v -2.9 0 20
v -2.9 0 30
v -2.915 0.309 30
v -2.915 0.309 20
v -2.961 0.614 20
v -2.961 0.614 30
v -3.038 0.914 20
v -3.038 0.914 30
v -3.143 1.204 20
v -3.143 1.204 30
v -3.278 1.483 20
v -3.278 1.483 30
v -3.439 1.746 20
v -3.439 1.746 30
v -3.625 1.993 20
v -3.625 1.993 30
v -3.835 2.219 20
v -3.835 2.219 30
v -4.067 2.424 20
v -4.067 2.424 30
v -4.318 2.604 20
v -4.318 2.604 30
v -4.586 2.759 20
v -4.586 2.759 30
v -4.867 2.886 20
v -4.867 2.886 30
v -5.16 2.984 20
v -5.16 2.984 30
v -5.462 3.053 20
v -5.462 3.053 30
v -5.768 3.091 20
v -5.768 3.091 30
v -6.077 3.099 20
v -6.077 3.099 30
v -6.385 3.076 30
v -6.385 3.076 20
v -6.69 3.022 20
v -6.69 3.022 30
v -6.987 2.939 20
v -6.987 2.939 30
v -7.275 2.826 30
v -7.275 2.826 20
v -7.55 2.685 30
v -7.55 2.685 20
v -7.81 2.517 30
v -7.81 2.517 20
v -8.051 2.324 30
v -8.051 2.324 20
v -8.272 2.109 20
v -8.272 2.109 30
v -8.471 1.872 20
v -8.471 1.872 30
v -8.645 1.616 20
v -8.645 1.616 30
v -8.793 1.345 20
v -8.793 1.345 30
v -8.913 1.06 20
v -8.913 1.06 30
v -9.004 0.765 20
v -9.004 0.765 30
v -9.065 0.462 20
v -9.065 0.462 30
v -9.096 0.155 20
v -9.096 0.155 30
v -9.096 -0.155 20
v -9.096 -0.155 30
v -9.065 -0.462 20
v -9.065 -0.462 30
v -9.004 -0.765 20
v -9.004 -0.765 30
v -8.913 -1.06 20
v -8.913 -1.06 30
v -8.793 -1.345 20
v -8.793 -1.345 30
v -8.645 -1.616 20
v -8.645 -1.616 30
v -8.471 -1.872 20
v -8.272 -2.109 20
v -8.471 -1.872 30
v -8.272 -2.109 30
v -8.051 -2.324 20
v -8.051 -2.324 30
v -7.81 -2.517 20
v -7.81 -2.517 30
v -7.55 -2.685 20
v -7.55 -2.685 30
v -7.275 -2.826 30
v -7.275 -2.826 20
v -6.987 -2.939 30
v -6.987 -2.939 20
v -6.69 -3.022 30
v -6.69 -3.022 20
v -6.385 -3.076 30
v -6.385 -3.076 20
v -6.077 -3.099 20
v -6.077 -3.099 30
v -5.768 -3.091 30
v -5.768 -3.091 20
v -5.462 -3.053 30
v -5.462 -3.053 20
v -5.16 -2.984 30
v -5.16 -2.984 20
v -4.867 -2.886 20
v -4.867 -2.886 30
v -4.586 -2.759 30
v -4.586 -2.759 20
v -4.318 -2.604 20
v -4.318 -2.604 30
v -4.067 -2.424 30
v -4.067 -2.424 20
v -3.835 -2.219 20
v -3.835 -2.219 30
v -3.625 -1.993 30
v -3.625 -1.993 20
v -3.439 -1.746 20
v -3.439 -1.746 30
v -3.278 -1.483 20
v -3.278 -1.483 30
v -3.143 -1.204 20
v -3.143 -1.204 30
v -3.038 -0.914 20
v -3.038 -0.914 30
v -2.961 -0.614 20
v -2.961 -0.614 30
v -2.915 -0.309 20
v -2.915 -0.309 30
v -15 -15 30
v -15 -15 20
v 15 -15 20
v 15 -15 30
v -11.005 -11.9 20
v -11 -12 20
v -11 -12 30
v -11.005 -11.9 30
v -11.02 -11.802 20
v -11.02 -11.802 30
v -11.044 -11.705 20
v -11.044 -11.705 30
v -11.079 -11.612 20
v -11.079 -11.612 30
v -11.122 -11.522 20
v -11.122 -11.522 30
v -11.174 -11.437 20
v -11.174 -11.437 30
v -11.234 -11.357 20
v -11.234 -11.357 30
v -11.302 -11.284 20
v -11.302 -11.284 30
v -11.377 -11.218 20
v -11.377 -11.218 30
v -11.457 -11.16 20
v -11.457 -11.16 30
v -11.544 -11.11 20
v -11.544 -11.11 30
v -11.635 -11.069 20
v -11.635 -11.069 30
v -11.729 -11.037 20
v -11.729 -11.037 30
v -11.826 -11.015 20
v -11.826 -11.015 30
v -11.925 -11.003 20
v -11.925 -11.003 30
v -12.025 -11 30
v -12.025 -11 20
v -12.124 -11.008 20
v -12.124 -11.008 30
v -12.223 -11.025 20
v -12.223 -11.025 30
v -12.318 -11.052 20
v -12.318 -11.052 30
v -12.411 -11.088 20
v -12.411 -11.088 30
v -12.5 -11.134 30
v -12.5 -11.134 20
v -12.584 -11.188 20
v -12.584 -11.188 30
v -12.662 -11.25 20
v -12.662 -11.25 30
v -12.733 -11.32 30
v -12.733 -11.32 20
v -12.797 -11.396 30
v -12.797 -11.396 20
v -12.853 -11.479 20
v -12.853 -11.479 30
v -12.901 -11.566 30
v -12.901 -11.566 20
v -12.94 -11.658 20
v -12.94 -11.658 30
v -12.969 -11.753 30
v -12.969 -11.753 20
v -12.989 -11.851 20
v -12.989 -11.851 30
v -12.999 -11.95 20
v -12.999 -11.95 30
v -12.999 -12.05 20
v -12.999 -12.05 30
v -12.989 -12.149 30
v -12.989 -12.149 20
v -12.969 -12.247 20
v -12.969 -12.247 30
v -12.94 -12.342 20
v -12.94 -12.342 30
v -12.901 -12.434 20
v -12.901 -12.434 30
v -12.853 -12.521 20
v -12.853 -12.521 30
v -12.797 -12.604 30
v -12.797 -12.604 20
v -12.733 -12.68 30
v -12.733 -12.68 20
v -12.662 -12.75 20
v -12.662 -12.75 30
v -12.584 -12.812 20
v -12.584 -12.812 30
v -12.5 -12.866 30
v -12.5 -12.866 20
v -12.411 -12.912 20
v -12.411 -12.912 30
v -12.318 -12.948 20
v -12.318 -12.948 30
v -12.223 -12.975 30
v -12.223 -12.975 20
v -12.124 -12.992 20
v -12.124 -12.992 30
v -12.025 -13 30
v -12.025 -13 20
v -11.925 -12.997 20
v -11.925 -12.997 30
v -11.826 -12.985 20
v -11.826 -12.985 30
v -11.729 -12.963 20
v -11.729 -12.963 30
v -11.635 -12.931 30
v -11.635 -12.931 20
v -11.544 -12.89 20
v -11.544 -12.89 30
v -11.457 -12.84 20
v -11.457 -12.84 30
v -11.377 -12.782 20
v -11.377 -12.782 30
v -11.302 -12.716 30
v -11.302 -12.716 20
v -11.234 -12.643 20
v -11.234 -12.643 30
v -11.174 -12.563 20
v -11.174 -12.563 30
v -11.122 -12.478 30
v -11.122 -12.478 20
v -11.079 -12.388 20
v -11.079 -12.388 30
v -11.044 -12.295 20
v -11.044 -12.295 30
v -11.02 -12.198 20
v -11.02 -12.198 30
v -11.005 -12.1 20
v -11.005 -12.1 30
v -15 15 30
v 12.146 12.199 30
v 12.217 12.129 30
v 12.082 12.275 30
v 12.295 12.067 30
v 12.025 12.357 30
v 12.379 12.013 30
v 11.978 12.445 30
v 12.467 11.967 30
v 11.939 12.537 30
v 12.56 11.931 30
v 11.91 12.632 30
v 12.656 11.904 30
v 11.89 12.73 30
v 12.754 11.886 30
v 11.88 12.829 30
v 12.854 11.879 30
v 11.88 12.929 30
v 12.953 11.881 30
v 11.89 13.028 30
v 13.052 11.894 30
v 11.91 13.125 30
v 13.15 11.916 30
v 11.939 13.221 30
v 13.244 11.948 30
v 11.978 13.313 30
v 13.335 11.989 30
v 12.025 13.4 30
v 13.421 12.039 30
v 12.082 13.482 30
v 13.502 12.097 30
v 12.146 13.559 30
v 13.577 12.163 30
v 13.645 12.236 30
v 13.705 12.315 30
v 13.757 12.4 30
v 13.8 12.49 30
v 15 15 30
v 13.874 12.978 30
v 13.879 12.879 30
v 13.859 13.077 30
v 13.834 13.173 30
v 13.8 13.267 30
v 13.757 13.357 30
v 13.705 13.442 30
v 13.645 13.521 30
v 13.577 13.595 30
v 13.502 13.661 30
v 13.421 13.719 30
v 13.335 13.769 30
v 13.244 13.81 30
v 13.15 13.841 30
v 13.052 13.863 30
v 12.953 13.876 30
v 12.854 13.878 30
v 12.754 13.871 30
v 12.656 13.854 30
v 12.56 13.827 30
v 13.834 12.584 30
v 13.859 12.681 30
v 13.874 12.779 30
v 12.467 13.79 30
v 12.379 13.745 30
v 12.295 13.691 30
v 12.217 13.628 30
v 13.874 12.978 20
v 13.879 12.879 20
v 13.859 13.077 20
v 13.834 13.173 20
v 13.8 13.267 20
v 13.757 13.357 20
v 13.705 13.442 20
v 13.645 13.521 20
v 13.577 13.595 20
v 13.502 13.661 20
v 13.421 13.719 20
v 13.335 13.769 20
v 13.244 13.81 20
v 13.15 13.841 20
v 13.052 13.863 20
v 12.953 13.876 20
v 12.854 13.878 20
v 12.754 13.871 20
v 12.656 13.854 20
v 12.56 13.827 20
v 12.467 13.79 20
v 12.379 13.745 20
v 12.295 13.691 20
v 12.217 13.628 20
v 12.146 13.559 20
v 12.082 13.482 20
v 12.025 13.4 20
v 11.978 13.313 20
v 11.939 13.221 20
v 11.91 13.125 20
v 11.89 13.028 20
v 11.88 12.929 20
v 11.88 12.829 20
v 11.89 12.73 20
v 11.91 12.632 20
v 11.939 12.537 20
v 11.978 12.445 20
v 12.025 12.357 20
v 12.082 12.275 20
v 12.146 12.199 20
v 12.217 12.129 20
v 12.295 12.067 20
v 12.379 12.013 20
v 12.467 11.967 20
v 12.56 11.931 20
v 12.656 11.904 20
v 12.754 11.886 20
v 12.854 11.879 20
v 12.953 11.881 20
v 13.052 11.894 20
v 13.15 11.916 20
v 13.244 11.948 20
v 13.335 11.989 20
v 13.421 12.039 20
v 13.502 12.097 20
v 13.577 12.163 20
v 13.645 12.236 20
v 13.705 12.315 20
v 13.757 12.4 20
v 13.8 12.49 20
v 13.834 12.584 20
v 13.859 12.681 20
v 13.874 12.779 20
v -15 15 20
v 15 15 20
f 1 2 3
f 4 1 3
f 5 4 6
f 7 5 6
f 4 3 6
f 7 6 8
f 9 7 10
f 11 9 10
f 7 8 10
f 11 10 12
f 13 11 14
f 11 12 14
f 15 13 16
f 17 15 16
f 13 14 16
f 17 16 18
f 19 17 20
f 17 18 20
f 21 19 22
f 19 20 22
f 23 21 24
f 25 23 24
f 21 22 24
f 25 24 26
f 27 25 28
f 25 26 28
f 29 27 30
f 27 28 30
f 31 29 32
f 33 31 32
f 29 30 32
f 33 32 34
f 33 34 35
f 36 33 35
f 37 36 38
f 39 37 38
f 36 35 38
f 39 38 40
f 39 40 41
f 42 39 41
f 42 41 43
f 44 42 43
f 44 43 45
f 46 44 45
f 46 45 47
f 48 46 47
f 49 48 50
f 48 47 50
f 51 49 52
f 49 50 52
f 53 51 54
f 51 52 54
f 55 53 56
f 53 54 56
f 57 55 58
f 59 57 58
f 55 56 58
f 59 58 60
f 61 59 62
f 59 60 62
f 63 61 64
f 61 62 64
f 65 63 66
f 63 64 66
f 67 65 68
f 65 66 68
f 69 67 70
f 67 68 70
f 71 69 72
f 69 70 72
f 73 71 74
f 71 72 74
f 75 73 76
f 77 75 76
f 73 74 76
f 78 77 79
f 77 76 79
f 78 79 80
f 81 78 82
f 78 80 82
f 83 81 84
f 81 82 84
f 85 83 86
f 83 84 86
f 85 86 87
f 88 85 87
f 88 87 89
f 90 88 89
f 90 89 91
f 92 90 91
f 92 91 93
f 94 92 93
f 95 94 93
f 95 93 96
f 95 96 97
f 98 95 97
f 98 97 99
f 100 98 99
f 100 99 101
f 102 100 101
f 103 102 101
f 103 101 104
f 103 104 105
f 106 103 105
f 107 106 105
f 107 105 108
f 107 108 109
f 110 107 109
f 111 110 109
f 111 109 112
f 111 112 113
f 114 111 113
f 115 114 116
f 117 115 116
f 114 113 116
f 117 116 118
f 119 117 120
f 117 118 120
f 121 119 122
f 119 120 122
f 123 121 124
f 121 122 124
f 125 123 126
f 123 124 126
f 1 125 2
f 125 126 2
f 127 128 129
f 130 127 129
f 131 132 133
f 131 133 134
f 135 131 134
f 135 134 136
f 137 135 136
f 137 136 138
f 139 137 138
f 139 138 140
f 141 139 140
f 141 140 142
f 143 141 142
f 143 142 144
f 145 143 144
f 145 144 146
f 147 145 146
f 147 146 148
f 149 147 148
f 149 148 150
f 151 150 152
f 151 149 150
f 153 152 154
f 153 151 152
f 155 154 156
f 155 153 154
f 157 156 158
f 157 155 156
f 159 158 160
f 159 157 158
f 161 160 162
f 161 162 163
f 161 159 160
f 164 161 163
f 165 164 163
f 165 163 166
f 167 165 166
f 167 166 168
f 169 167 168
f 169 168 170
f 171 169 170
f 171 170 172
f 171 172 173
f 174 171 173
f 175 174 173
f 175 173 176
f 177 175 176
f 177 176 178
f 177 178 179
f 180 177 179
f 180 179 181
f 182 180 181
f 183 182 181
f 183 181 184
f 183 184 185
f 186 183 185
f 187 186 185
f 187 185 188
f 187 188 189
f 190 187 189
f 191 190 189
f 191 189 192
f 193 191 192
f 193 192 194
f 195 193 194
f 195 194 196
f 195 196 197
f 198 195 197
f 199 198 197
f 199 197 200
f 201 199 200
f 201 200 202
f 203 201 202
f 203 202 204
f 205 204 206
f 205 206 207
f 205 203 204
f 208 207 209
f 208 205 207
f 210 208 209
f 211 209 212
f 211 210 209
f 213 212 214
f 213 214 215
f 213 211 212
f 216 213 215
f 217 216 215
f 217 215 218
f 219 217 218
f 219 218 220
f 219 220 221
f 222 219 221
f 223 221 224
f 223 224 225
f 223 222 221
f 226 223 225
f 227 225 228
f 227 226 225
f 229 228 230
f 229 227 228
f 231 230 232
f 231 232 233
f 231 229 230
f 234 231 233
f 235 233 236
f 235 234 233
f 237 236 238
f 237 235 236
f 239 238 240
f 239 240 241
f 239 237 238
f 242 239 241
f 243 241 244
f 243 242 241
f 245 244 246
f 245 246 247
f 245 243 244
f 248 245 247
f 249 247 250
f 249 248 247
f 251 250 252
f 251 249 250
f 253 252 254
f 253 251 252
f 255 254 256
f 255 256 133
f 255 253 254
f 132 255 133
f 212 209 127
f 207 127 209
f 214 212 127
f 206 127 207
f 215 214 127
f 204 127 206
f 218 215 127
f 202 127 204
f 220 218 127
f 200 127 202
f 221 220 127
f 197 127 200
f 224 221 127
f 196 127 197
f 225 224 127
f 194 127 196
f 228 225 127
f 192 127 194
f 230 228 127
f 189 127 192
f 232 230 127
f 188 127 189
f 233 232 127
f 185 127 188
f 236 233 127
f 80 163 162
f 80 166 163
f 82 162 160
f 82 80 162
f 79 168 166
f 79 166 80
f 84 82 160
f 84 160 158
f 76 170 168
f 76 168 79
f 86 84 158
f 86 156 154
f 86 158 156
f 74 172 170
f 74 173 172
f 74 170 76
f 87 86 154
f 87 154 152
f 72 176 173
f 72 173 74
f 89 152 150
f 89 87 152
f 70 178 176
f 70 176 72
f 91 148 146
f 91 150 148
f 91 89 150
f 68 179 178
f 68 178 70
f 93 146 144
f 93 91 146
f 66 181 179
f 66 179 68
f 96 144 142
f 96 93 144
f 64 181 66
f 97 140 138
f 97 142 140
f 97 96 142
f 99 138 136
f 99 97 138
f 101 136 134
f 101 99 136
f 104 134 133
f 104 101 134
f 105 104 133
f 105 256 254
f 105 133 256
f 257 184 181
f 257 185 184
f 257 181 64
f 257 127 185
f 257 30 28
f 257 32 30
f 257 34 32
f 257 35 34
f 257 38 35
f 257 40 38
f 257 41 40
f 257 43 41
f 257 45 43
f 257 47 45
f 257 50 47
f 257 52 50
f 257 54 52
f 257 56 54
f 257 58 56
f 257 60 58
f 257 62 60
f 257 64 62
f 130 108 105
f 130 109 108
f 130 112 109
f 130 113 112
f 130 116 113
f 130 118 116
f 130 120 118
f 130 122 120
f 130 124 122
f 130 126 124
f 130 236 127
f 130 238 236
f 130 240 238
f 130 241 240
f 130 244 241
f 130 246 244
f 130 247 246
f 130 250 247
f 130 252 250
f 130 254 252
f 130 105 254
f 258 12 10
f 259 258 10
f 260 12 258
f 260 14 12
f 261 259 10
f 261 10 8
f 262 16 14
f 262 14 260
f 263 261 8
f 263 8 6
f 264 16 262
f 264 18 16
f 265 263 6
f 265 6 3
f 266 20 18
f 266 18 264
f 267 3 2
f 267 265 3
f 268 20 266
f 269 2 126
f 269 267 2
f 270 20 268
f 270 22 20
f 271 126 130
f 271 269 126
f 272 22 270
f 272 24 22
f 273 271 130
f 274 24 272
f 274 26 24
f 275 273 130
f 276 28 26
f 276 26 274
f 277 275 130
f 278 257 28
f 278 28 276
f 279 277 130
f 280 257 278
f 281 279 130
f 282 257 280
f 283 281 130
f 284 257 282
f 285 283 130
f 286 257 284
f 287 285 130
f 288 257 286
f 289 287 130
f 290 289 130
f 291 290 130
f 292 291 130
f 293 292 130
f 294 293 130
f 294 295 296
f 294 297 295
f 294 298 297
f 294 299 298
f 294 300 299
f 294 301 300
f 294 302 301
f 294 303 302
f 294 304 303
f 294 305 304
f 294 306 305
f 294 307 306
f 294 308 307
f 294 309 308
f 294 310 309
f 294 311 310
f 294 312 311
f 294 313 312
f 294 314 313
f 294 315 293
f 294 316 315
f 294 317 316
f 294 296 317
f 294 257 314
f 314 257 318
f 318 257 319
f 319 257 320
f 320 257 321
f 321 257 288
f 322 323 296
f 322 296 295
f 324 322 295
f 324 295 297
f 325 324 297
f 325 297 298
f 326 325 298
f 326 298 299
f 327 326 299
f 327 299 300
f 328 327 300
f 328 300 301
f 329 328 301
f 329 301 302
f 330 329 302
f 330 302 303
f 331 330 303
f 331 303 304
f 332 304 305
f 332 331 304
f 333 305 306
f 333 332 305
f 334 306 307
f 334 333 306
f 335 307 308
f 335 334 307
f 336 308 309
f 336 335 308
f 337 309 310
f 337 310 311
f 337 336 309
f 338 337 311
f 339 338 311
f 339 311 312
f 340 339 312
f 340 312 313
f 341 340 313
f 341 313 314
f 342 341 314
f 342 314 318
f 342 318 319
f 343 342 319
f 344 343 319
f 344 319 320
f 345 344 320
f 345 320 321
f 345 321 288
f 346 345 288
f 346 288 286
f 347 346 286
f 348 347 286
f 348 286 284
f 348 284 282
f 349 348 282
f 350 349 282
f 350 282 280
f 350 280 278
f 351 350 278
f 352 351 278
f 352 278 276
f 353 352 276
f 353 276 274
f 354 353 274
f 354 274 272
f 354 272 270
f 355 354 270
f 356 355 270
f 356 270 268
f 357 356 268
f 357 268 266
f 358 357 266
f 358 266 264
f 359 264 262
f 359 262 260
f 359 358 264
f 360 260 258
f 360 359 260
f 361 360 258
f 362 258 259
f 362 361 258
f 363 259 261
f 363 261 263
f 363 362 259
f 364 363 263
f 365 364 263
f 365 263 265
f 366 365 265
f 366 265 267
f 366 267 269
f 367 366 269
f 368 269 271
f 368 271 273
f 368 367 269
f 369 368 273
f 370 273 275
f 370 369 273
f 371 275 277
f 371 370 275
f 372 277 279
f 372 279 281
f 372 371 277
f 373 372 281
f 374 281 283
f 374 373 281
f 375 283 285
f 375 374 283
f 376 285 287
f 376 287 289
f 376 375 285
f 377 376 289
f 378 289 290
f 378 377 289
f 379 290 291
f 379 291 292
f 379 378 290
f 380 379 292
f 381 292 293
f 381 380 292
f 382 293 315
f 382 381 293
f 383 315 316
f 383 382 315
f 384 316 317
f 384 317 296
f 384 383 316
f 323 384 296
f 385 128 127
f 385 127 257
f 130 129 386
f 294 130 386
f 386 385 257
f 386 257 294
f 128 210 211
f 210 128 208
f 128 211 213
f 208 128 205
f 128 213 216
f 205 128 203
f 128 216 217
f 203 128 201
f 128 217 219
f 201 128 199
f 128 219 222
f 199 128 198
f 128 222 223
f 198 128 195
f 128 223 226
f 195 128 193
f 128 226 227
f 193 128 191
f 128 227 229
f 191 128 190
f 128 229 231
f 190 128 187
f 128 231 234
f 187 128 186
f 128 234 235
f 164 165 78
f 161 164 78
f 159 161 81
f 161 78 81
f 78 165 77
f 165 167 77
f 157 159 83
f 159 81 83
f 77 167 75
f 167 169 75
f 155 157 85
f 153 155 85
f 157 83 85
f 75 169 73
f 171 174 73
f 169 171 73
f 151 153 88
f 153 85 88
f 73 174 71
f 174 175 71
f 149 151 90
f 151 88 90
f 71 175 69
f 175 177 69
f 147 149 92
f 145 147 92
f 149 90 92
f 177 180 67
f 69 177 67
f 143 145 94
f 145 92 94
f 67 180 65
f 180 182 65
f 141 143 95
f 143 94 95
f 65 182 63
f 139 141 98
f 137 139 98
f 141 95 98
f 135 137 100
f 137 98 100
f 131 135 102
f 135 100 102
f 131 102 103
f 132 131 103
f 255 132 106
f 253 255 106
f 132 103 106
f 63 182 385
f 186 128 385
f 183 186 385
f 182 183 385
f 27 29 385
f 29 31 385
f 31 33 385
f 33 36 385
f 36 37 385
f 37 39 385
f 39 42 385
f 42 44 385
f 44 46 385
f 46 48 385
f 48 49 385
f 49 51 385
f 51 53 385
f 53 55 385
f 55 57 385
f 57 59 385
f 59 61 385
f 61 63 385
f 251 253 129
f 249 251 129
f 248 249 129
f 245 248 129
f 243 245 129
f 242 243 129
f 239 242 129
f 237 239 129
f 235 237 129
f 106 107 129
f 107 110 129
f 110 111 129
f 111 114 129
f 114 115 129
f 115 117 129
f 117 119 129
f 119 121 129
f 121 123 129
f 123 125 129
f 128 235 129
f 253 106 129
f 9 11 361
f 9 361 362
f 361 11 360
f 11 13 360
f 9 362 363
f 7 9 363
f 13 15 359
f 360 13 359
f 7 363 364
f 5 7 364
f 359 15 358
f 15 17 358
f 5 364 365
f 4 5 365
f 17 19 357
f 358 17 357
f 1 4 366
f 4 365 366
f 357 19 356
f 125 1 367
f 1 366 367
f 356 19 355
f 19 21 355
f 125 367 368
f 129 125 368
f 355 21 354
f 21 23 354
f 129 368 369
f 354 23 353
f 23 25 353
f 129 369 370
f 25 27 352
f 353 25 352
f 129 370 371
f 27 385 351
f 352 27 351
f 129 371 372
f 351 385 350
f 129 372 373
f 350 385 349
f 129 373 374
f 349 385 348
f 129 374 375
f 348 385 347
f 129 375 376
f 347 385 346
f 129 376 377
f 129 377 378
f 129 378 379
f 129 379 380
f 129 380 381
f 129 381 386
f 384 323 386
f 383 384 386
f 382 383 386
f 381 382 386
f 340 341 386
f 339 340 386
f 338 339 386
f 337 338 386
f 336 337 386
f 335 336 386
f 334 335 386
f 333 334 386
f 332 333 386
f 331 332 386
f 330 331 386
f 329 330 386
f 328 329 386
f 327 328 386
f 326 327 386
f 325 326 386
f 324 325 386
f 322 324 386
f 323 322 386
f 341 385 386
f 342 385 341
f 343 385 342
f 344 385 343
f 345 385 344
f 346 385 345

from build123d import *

# Parameters (mm, degrees)
SKETCH1_W             = 30
SKETCH1_H             = 30
BOSS_EXTRUDE1_DEPTH   = 10
SKETCH2_W             = 30
SKETCH2_H             = 30
SKETCH2_W_2           = 20
SKETCH2_H_2           = 20
BOSS_EXTRUDE2_DEPTH   = 10
SKETCH2_W_3           = 5
SKETCH2_H_3           = 3.748828889
BOSS_EXTRUDE2_2_DEPTH = 10
BOSS_EXTRUDE2_3_DEPTH = 10
SKETCH3_W             = 30
SKETCH3_H             = 30
BOSS_EXTRUDE3_DEPTH   = 10
SKETCH4_R             = 3.1
CUT_EXTRUDE1_DEPTH    = 10
SKETCH5_R             = 3.1
CUT_EXTRUDE2_DEPTH    = 10
CUT_EXTRUDE3_START    = -30
SKETCH8_R             = 1
CUT_EXTRUDE3_DEPTH    = 30


with BuildPart() as part:
    # Sketch1 → Boss-Extrude1 (new body)
    with BuildSketch(Plane.XY):
        Rectangle(SKETCH1_W, SKETCH1_H)
    extrude(amount=BOSS_EXTRUDE1_DEPTH)

    # Sketch5 → Cut-Extrude2 (cut)
    with BuildSketch(Plane(origin=(0, 0, 0), x_dir=(-1, 0, 0), z_dir=(0, 0, -1))):
        with Locations((-6, -0.372899474)):
            Circle(SKETCH5_R)
    extrude(amount=-CUT_EXTRUDE2_DEPTH, mode=Mode.SUBTRACT)


with BuildPart() as body_2:
    # Sketch2 → Boss-Extrude2 (new body)
    with BuildSketch(Plane.XY.offset(10)):
        Rectangle(SKETCH2_W, SKETCH2_H)
        Rectangle(SKETCH2_W_2, SKETCH2_H_2, mode=Mode.SUBTRACT)
    extrude(amount=BOSS_EXTRUDE2_DEPTH)


with BuildPart() as body_3:
    # Sketch2 → Boss-Extrude2 2 (new body)
    with BuildSketch(Plane.XY.offset(10)):
        with Locations((0, 5.374414445)):
            Rectangle(SKETCH2_W_3, SKETCH2_H_3)
    extrude(amount=BOSS_EXTRUDE2_2_DEPTH)


with BuildPart() as body_4:
    # Sketch2 → Boss-Extrude2 3 (new body)
    with BuildSketch(Plane.XY.offset(10)):
        with Locations((0, -5.374414445)):
            Rectangle(SKETCH2_W_3, SKETCH2_H_3)
    extrude(amount=BOSS_EXTRUDE2_3_DEPTH)


with BuildPart() as body_5:
    # Sketch3 → Boss-Extrude3 (new body)
    with BuildSketch(Plane.XY.offset(20)):
        Rectangle(SKETCH3_W, SKETCH3_H)
    extrude(amount=BOSS_EXTRUDE3_DEPTH)

    # Sketch4 → Cut-Extrude1 (cut)
    with BuildSketch(Plane.XY.offset(30)):
        with Locations((-6, 0)):
            Circle(SKETCH4_R)
    extrude(amount=-CUT_EXTRUDE1_DEPTH, mode=Mode.SUBTRACT)


with BuildPart() as cut_extrude3_tool:
    # Sketch8 → Cut-Extrude3 (new body)
    with BuildSketch(Plane.XY.offset(30).offset(CUT_EXTRUDE3_START)):
        with Locations((-12, -12)):
            Circle(SKETCH8_R)
        with Locations((12.878679656, 12.878679656)):
            Circle(SKETCH8_R)
    extrude(amount=CUT_EXTRUDE3_DEPTH)


with BuildPart() as part_1:
    add(part.part)

    # Cut-Extrude3: cut by cut_extrude3_tool
    add(cut_extrude3_tool.part, mode=Mode.SUBTRACT)


with BuildPart() as body_2_1:
    add(body_2.part)

    # Cut-Extrude3: cut by cut_extrude3_tool
    add(cut_extrude3_tool.part, mode=Mode.SUBTRACT)


with BuildPart() as body_5_1:
    add(body_5.part)

    # Cut-Extrude3: cut by cut_extrude3_tool
    add(cut_extrude3_tool.part, mode=Mode.SUBTRACT)


solid = body_5_1.part
